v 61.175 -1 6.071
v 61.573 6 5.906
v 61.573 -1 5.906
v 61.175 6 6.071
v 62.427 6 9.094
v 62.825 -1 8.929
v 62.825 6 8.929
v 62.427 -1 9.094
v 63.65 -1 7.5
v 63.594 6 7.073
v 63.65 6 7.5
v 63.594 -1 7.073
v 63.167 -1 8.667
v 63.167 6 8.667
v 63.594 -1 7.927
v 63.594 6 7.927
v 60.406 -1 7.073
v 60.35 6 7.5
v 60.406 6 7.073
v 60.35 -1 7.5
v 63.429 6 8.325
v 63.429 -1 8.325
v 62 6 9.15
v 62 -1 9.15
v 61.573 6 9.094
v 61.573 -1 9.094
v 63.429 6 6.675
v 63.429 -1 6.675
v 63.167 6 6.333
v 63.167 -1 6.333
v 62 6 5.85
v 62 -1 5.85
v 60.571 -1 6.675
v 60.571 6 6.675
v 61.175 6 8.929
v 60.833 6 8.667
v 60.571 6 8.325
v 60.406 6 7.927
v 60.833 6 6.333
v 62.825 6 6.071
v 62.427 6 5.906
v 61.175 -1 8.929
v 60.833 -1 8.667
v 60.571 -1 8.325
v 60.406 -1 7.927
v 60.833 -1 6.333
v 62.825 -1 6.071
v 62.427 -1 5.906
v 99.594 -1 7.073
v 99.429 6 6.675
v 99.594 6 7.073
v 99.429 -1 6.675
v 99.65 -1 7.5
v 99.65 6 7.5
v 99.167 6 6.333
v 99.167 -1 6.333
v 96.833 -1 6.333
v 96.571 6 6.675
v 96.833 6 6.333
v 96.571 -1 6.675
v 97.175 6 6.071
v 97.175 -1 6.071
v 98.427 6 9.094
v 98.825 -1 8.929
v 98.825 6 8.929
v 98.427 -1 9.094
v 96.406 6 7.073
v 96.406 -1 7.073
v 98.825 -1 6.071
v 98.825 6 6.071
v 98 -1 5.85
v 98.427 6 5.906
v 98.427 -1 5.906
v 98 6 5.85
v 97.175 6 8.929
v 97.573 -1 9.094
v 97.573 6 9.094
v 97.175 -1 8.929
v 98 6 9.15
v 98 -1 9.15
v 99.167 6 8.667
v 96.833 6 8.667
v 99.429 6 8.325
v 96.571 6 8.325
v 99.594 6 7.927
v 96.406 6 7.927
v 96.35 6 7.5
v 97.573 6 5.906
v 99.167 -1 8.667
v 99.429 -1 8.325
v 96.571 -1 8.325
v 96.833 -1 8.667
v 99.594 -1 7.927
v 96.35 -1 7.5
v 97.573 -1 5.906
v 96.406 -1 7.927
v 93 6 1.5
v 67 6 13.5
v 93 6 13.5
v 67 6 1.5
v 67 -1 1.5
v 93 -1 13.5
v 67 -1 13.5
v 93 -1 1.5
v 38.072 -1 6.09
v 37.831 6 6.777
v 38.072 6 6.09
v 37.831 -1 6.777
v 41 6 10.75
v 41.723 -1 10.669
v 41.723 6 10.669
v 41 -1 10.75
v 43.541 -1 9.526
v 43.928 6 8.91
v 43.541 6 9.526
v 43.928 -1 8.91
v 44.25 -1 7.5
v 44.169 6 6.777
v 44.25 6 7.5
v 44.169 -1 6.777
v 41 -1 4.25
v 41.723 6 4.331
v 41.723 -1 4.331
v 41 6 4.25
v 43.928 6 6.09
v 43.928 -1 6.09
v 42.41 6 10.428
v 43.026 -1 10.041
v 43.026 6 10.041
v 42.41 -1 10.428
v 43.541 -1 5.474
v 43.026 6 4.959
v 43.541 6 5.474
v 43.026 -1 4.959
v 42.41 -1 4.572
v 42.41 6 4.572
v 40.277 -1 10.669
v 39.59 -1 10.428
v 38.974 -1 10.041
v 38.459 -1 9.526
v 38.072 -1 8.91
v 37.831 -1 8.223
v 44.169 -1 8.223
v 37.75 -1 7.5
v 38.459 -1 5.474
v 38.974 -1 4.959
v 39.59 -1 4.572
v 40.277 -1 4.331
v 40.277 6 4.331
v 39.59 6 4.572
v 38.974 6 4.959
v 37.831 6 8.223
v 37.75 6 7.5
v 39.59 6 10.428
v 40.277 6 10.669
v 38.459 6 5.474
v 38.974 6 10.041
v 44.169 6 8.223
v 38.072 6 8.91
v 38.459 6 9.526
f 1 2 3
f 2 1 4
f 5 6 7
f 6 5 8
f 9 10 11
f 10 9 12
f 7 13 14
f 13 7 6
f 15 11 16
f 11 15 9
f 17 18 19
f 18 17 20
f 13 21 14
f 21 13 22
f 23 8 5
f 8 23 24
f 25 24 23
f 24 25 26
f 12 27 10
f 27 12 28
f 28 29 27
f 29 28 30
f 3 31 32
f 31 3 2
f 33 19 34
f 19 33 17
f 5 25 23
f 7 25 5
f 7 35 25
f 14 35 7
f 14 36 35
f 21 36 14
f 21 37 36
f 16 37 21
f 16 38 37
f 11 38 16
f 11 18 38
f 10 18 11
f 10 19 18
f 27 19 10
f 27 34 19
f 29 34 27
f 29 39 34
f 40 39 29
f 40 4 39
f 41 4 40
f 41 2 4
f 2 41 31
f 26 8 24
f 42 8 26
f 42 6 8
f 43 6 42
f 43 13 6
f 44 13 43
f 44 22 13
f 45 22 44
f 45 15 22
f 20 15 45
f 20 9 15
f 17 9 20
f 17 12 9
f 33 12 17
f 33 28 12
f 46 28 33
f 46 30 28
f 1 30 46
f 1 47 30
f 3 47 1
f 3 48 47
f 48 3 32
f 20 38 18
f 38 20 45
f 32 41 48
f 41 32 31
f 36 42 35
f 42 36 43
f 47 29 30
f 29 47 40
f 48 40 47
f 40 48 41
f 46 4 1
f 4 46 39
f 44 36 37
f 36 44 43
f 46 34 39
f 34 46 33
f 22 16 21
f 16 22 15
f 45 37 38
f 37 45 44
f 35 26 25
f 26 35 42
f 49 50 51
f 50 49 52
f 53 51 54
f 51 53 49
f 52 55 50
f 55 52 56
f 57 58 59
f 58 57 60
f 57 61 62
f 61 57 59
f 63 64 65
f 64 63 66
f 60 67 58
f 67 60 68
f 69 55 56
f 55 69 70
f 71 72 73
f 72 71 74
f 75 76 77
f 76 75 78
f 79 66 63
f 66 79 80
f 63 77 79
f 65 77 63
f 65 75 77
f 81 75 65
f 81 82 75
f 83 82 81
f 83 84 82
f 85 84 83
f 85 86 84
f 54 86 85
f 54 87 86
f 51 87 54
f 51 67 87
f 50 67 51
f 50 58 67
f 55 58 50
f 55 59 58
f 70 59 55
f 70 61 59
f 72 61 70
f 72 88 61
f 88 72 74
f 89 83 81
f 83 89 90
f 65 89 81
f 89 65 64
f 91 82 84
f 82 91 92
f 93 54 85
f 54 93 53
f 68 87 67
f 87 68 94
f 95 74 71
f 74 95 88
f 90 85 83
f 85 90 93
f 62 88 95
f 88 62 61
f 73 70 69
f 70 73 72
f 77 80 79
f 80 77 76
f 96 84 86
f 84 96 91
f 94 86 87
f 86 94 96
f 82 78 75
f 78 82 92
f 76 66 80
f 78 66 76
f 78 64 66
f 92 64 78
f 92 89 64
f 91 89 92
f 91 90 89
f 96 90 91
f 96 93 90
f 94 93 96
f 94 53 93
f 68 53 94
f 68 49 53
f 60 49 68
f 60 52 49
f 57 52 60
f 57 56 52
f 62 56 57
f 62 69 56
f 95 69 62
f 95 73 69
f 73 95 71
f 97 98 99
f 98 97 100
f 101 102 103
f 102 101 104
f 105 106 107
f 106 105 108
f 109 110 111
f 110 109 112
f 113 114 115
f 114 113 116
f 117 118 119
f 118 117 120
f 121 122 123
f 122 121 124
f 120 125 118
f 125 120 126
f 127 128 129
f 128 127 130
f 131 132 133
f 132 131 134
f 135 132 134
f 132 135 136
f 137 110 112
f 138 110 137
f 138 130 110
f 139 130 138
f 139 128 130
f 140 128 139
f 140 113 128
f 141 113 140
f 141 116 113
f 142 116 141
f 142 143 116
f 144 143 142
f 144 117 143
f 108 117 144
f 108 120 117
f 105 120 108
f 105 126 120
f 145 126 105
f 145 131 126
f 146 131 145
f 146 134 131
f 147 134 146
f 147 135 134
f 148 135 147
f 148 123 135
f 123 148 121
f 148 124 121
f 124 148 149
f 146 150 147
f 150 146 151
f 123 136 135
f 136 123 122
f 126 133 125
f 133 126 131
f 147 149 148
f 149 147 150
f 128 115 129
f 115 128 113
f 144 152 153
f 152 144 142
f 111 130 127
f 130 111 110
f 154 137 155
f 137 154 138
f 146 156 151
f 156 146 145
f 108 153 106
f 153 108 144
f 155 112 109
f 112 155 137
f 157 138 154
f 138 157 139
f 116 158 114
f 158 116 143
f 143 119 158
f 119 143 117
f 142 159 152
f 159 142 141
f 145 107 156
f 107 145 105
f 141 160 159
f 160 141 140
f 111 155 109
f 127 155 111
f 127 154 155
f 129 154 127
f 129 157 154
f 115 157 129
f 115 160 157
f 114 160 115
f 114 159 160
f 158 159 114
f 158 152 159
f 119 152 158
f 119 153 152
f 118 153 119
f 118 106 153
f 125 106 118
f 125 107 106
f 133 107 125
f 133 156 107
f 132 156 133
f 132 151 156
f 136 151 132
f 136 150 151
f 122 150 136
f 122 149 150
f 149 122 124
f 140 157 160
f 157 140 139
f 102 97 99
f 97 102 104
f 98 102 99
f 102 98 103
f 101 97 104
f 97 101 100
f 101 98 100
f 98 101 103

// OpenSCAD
// =============================================================================
// OpenMotorBridge - Main Box: Front Face & Antenna Cutout Tools
// =============================================================================
// File: hardware/cad/scad/01_main_box/parts/012_front_cutouts.scad
// Description: Parametric interface cutouts for the Central Box Oberwanne:
//              1. Deutsch DTM-12 automotive connector flange (J1).
//              2. IP67 waterproof USB-C service port with threaded cap.
//              3. Hardware SW1 button (Pair / Reset) with rubber boot.
//              4. WS2812B RGB Status LED light pipe window (Ø 3.2 mm).
//              5. Optional rear SMA antenna bulkhead port (Ø 6.5 mm with O-ring seat)
//                 for external high-gain LoRa 868 MHz rally antenna.
// =============================================================================

include <../../00_common/parameters.scad>;

module main_box_front_cutout_tool(wall_th=5.0) {
    // Height center along Z: Mid tray height is 15.0 mm. Center is at Z = 7.5 mm.
    z_mid = 7.5;

    // 1. IP67 USB-C Waterproof Panel Port (centered at X = 75.3 mm)
    // Round threaded barrel Ø 11.0 mm with flat indexing
    translate([75.3, -1.0, z_mid])
        rotate([-90, 0, 0])
            cylinder(r=5.5, h=wall_th + 2.0, center=false, $fn=32);

    // 2. WS2812B RGB Status LED Light Pipe Window (directly right of USB-C at X = 84.5 mm)
    // Ø 3.2 mm bore for diffuse PMMA light pipe with sealing O-ring
    translate([84.5, -1.0, z_mid])
        rotate([-90, 0, 0])
            cylinder(r=1.6, h=wall_th + 2.0, center=false, $fn=24);

    // 3. Hardware SW1 Push-Button (Pair / Reset at X = 41.0 mm)
    // Ø 6.5 mm bore for waterproof IP67 miniature tactile button with silicone boot
    translate([41.0, -1.0, z_mid])
        rotate([-90, 0, 0])
            cylinder(r=3.25, h=wall_th + 2.0, center=false, $fn=28);

    // 4. Automotive Deutsch DTM-12 Header Cutout (centered at X = 80.0 mm)
    // Rectangular pass-through 26.0 x 12.0 mm for 12-pin automotive sealed plug
    translate([80.0, wall_th/2.0, z_mid])
        cube([26.0, wall_th + 2.0, 12.0], center=true);

    // 2x M3 Flange Fastening Holes for DTM-12 (Pitch = 36.0 mm: X = 62.0 and 98.0 mm)
    for (dx = [-18.0, 18.0]) {
        translate([80.0 + dx, -1.0, z_mid])
            rotate([-90, 0, 0])
                cylinder(r=M3_SCREW_HOLE_R, h=wall_th + 2.0, center=false, $fn=24);
    }
}

// Module for Optional Rear SMA Antenna Knockout Port (0.4 mm Knockout Membrane)
// Default state: 100% solid, sealed, airtight & leak-proof (IP68 / IP69K).
// Optional: Membrane can be punched out with a screwdriver for external SMA bulkhead.
module main_box_rear_antenna_cutout_tool(length=110.0, width=74.0, wall_th=2.5, membrane_th=0.4) {
    z_mid = 7.5;
    // Positioned at rear wall (Y = width) near SX1262 LoRa module (X = 85.0 mm)
    // Outer face is at Y = width. Inner face is at Y = width - wall_th.

    // 1. External O-Ring Sealing Pocket (from outside face Y = width inward, depth = 1.2 mm)
    translate([85.0, width + 0.1, z_mid]) {
        rotate([90, 0, 0]) {
            cylinder(r=SMA_ORECESS_R, h=SMA_ORECESS_DEPTH + 0.1, center=false, $fn=32);
        }
    }

    // 2. Internal Pilot Bore (from inside face Y = width - wall_th outward toward membrane)
    // Leaves exact 0.4 mm solid membrane between internal bore and outer O-ring pocket
    inner_bore_depth = wall_th - SMA_ORECESS_DEPTH - membrane_th;
    if (inner_bore_depth > 0) {
        translate([85.0, width - wall_th - 0.1, z_mid]) {
            rotate([-90, 0, 0]) {
                cylinder(r=SMA_BORE_R, h=inner_bore_depth + 0.1, center=false, $fn=32);
            }
        }
    }
}

// Standalone preview
main_box_front_cutout_tool();
